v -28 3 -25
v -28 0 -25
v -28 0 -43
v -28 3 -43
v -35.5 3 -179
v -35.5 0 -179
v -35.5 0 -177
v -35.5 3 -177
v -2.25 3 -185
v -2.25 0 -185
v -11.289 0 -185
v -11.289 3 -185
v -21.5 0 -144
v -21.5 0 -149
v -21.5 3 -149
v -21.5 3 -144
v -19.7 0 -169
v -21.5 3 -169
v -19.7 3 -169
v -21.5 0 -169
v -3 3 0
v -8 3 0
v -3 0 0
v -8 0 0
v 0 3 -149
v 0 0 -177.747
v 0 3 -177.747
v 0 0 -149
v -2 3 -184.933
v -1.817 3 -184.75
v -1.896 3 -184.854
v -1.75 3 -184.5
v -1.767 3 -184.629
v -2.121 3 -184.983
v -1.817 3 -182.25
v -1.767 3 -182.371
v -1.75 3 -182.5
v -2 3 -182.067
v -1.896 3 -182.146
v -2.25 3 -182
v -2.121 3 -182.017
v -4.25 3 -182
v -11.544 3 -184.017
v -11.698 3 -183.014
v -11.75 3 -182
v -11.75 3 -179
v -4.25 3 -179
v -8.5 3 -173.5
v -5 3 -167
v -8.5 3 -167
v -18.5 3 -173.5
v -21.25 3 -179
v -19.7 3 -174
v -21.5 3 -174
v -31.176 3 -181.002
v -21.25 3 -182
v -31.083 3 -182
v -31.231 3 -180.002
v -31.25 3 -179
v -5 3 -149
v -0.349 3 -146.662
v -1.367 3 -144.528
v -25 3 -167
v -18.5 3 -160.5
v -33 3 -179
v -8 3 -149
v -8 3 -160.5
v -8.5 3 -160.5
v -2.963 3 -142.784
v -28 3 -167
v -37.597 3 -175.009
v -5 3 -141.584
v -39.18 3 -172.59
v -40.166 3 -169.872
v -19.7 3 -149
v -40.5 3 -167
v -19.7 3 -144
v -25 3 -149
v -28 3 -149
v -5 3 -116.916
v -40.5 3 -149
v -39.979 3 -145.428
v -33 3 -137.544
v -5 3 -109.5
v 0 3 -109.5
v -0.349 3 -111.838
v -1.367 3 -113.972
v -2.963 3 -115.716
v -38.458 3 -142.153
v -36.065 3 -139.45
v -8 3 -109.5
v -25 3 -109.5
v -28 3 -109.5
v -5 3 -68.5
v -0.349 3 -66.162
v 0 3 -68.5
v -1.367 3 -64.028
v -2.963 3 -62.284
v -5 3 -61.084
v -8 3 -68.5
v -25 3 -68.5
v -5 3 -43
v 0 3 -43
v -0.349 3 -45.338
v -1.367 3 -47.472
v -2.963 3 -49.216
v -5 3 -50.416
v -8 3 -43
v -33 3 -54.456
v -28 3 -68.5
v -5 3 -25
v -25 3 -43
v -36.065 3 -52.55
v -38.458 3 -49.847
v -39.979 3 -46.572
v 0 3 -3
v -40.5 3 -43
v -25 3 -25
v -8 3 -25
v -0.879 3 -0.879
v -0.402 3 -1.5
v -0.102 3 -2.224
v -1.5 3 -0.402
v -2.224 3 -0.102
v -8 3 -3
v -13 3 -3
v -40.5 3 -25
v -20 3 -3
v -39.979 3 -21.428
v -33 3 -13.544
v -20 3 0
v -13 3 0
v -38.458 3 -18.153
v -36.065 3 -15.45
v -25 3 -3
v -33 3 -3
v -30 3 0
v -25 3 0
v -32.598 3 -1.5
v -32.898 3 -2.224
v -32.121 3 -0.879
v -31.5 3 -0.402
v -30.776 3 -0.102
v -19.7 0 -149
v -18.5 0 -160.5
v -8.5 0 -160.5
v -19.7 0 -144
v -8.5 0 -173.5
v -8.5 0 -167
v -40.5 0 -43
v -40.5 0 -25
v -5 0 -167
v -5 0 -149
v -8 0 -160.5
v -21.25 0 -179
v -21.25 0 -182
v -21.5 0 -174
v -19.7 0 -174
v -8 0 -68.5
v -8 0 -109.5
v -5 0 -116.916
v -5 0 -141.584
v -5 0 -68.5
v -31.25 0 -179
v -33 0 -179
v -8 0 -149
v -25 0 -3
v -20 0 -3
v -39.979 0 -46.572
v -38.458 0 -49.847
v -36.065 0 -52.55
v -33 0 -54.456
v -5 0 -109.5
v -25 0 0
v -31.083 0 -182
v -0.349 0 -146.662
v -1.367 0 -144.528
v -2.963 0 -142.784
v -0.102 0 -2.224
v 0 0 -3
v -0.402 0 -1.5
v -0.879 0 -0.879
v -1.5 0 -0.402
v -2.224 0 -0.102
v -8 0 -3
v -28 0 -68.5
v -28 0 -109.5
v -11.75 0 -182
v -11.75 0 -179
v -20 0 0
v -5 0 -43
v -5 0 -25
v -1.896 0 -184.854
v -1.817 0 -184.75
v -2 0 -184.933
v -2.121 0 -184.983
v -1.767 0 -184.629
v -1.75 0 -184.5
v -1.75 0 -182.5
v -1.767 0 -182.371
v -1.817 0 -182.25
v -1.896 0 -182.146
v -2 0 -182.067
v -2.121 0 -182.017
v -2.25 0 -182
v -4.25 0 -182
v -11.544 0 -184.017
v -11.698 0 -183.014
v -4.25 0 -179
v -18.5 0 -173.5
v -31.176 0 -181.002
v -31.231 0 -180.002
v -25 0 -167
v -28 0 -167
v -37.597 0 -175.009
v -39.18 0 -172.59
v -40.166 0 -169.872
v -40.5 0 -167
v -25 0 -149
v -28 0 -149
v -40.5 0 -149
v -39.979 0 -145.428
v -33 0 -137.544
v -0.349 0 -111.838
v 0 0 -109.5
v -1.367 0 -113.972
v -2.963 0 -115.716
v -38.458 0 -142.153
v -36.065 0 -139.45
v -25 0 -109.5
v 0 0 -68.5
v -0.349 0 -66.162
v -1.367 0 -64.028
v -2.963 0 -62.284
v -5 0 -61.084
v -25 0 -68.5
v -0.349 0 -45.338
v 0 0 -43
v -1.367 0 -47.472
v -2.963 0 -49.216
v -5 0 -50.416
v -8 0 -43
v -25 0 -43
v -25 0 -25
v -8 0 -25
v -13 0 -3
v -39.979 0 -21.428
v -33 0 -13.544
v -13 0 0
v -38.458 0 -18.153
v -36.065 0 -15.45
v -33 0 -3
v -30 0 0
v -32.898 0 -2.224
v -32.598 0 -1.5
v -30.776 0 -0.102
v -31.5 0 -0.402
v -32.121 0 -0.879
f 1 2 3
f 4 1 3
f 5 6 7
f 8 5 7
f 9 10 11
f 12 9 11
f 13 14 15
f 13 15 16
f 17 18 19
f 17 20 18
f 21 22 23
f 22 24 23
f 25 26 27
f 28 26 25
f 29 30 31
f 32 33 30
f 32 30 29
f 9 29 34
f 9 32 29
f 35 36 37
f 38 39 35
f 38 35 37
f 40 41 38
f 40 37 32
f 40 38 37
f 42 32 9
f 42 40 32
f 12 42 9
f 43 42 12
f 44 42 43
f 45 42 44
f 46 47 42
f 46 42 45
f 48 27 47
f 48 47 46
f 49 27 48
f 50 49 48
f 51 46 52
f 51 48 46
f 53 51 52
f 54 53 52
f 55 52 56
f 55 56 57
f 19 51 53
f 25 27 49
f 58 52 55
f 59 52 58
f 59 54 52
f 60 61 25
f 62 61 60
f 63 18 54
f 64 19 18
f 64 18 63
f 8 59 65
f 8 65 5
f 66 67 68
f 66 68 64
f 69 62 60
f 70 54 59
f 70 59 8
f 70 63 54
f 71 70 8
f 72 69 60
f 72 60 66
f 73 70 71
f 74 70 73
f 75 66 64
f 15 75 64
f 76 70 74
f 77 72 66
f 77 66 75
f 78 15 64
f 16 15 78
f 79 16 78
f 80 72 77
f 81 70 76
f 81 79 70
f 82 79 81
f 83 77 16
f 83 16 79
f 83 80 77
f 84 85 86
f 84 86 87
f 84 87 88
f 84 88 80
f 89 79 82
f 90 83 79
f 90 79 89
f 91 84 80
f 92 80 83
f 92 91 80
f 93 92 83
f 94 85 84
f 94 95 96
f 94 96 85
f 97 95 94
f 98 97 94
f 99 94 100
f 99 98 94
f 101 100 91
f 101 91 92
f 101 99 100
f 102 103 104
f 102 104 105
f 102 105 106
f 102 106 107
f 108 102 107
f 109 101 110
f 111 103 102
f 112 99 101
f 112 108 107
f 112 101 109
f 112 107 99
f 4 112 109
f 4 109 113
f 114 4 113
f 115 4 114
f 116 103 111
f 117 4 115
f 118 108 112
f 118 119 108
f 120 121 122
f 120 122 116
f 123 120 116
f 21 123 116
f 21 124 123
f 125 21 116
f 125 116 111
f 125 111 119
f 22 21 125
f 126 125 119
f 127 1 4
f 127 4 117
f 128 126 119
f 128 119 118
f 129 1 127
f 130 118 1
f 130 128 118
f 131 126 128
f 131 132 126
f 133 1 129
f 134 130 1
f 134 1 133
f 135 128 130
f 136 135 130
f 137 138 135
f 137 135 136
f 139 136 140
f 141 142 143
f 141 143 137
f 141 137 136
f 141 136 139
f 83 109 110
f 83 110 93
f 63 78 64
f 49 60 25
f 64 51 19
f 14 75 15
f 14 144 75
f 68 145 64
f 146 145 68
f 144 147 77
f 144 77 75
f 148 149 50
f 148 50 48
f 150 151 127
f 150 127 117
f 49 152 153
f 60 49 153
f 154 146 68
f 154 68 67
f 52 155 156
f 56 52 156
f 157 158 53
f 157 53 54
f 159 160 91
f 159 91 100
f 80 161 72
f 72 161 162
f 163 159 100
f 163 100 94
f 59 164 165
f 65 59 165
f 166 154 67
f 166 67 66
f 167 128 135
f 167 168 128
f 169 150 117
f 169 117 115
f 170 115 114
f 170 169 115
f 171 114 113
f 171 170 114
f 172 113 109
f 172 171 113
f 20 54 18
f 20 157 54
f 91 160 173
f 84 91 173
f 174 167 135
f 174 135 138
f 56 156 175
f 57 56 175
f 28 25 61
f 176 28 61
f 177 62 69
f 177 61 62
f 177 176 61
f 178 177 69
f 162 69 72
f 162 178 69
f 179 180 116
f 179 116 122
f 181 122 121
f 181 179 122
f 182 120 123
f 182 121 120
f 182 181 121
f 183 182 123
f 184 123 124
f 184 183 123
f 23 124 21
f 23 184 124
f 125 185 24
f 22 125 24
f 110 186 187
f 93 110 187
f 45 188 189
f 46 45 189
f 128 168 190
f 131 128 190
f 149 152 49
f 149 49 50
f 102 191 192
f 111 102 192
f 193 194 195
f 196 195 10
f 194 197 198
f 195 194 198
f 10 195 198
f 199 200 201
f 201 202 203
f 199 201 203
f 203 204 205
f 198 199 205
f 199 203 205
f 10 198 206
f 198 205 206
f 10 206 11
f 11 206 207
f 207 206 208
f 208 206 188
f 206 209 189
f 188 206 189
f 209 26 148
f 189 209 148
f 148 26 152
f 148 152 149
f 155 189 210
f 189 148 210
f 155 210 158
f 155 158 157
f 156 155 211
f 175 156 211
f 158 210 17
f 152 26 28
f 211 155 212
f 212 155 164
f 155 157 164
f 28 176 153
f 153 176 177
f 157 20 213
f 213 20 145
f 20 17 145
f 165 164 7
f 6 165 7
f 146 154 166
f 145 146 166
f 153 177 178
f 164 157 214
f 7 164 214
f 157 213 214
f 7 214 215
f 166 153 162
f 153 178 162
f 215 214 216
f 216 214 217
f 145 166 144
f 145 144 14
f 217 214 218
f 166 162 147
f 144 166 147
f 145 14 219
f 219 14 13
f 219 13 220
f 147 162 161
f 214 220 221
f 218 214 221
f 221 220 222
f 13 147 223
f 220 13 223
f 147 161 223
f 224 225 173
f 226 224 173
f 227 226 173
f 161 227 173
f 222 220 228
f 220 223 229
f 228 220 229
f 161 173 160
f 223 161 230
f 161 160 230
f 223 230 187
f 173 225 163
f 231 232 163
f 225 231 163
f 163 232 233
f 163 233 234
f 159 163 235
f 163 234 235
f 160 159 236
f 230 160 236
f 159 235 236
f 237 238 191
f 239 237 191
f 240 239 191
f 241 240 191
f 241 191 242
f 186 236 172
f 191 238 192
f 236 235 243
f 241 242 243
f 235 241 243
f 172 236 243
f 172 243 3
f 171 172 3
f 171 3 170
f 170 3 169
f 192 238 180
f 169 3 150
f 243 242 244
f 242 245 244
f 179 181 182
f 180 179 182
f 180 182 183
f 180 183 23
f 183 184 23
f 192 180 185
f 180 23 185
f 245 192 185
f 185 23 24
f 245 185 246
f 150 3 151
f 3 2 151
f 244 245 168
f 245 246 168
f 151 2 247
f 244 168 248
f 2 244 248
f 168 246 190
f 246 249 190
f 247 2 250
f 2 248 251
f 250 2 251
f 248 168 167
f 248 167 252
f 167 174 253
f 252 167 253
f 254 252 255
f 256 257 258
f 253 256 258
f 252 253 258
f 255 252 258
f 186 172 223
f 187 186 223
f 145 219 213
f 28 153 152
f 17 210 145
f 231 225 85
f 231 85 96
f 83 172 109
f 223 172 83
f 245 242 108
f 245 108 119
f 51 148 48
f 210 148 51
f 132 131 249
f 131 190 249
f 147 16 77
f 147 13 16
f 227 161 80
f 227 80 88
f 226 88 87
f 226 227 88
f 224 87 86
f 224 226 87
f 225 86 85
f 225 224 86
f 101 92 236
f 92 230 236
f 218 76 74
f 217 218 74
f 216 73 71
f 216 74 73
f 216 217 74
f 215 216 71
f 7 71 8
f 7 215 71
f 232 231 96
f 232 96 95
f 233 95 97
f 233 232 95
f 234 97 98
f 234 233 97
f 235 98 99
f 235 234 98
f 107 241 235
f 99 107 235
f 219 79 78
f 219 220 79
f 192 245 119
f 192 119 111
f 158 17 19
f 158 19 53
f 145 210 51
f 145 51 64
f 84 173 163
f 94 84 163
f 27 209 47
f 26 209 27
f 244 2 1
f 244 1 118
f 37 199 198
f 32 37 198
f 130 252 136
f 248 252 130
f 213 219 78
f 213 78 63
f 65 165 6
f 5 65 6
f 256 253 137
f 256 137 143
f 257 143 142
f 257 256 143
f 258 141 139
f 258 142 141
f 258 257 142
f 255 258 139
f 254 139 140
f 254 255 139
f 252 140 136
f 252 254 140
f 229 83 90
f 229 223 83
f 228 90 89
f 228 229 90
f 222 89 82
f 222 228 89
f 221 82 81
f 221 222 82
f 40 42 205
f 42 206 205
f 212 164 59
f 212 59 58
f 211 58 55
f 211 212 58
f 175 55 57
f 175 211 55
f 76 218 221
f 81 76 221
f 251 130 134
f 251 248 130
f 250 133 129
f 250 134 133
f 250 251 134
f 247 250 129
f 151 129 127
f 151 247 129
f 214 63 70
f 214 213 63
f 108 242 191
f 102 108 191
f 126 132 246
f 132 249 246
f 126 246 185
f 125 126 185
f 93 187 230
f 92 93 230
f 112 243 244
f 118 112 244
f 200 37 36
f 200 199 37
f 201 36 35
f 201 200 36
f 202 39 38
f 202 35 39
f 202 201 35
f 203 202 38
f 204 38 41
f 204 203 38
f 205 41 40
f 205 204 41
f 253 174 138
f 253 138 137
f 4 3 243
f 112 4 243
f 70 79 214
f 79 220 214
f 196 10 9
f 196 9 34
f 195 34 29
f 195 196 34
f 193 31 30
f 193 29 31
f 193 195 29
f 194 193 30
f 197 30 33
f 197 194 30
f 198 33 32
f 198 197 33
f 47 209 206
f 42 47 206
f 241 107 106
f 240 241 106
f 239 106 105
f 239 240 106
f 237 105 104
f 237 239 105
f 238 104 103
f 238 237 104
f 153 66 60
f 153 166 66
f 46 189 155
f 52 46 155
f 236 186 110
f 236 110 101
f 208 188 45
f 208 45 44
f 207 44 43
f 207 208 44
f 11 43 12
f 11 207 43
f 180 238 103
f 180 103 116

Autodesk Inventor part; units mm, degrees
ref_plane "YZ Plane" through (0, 0, 0) normal (1, 0, 0) x (0, 1, 0)
ref_plane "XZ Plane" through (0, 0, 0) normal (0, 1, 0) x (-1, 0, 0)
ref_plane "XY Plane" through (0, 0, 0) normal (0, 0, 1) x (1, 0, 0)
sketch "Sketch1" plane through (0, 0, 0) normal (0, 1, 0) x (-1, 0, 0)
  line L0 (28, -25) -> (25, -25)
  line L1 (28, -43) -> (25, -43)
  line L2 (28, -68.5) -> (25, -68.5)
  line L3 (28, -109.5) -> (25, -109.5)
  line L4 (8, -68.5) -> (5, -68.5)
  line L5 (8, -109.5) -> (5, -109.5)
  line L6 (8, -43) -> (5, -43)
  line L7 (8, -25) -> (5, -25)
  line L8 (25, -109.5) -> (25, -68.5)
  line L9 (25, -43) -> (25, -25)
  line L10 (8, -109.5) -> (8, -68.5)
  line L11 (8, -43) -> (8, -25)
  line L12 (8, -160.5) -> (8, -149)
  line L13 (28, -149) -> (25, -149)
  line L14 (8, -149) -> (5, -149)
  line L15 (25, -149) -> (25, -167)
  line L16 (25, -167) -> (28, -167)
  line L17 (5, -167) -> (8.5, -167)
  line L18 (21.5, -169) -> (19.7, -169)
  line L19 (19.7, -169) -> (19.7, -174)
  line L20 (19.7, -174) -> (21.5, -174)
  line L21 (21.5, -174) -> (21.5, -169)
  line L22 (16.5, -110.2512) -> (16.5, -143.2512) construction
  line L23 (28, -25) -> (28, -43)
  line L24 (28, -68.5) -> (28, -109.5)
  line L25 (28, -149) -> (28, -167)
  line L26 (5, -167) -> (5, -149)
  line L27 (5, -109.5) -> (5, -68.5)
  line L28 (5, -43) -> (5, -25)
  line L29 (13, -3) -> (8, -3)
  line L30 (20, -3) -> (20, 0)
  line L31 (20, 0) -> (13, 0)
  line L32 (13, 0) -> (13, -3)
  line L33 (20, -3) -> (25, -3)
  line L34 (4.25, -179) -> (4.25, -182)
  line L35 (11.75, -179) -> (21.25, -179)
  line L36 (21.25, -179) -> (21.25, -182)
  line L37 (21.25, -182) -> (31.0828, -182)
  line L38 (31.25, -179) -> (33, -179)
  line L39 (4.25, -182) -> (2.25, -182)
  line L40 (25, -3) -> (25, 0)
  line L41 (25, 0) -> (30, 0)
  line L42 (8, -3) -> (8, 0)
  line L43 (8, 0) -> (3, 0)
  line L44 (2.25, -185) -> (11.2894, -185)
  arc A0 (31.0828, -182) -> (31.25, -179) centre (4.25, -179) ccw
  arc A1 (5, -141.5838) -> (0, -149) centre (8, -149) ccw
  arc A2 (5, -61.0838) -> (0, -68.5) centre (8, -68.5) ccw
  line L45 (5, -50.4162) -> (5, -61.0838)
  line L46 (5, -116.9162) -> (5, -141.5838)
  line L47 (19.5, -129.25) -> (13.2, -129.25) construction
  arc A3 (0, -109.5) -> (5, -116.9162) centre (8, -109.5) ccw
  line L48 (0, -177.7474) -> (0, -149)
  arc A4 (0, -43) -> (5, -50.4162) centre (8, -43) ccw
  line L49 (0, -109.5) -> (0, -68.5)
  line L50 (0, -43) -> (0, -3)
  arc A5 (33, -54.4564) -> (40.5, -43) centre (28, -43) ccw
  line L51 (40.5, -25) -> (40.5, -43)
  arc A6 (40.5, -25) -> (33, -13.5436) centre (28, -25) ccw
  line L52 (33, -3) -> (33, -13.5436)
  arc A7 (40.5, -149) -> (33, -137.5436) centre (28, -149) ccw
  line L53 (40.5, -167) -> (40.5, -149)
  arc A8 (35.5, -177) -> (40.5, -167) centre (28, -167) ccw
  line L54 (33, -54.4564) -> (33, -137.5436)
  arc A9 (33, -3) -> (30, 0) centre (30, -3) ccw
  arc A10 (3, 0) -> (0, -3) centre (3, -3) ccw
  line L55 (21.5, -144) -> (19.7, -144)
  line L56 (19.7, -144) -> (19.7, -149)
  line L57 (19.7, -149) -> (21.5, -149)
  line L58 (21.5, -149) -> (21.5, -144)
  line L59 (18.5, -160.5) -> (8.5, -160.5)
  line L60 (8.5, -167) -> (8.5, -173.5)
  line L61 (8.5, -173.5) -> (18.5, -173.5)
  line L62 (18.5, -173.5) -> (18.5, -160.5)
  line L63 (13.5, -163.9683) -> (13.5, -168.686) construction
  line L64 (14.8699, -167) -> (11.7199, -167) construction
  arc A11 (11.2894, -185) -> (11.75, -182) centre (1.75, -182) ccw
  line L65 (11.75, -182) -> (11.75, -179)
  line L66 (14.25, -179) -> (14.25, -182) construction
  line L67 (14.25, -182) -> (4.25, -182) construction
  line L68 (31.25, -179) -> (31.25, -182) construction
  line L69 (31.25, -182) -> (31.0828, -182) construction
  line L70 (33, -179) -> (35.5, -179)
  line L71 (35.5, -179) -> (35.5, -177)
  line L72 (33, -179) -> (33, -174.1753) construction
  line L73 (28, -179) -> (28, -186) construction
  line L74 (28, -186) -> (25, -186) construction
  line L75 (25, -186) -> (25, -179) construction
  line L76 (31.25, -179) -> (21.25, -179) construction
  line L77 (4.25, -179) -> (0, -177.7474)
  line L78 (1.75, -182.5) -> (1.75, -184.5)
  arc A12 (2.25, -182) -> (1.75, -182.5) centre (2.25, -182.5) ccw
  arc A13 (1.75, -184.5) -> (2.25, -185) centre (2.25, -184.5) ccw
  line L79 (8.5, -160.5) -> (8, -160.5)
  line L80 (26.5, -73.5989) -> (26.5, -105.0523) construction
  line L81 (6.5, -72.0232) -> (6.5, -105.7187) construction
  point P0 (0, 0)
  point P1 (1.75, -185)
  dimension "d7" = 18
  dimension "d8" = 25.5
  dimension "d9" = 41
  dimension "d39" = 18
  dimension "d45" = 5
  dimension "d56" = 3
  dimension "d61" = 39.5
  dimension "d64" = 12
  dimension "d65" = 7
  dimension "d74" = 176
  dimension "d75" = 17
  dimension "d85" = 10
  dimension "d90" = 5
  dimension "d92" = 25
  dimension "d104" = 6
  dimension "d105" = 5
  dimension "d106" = 1.8
  dimension "d107" = 3.5
  dimension "d108" = 20
  dimension "d112" = 8
  dimension "d113" = 12
  dimension "d114" = 7
  dimension "d115" = 10
  dimension "d116" = 3
  dimension "d121" = 2.5
  dimension "d122" = 25
  dimension "d123" = 7
  dimension "d124" = 10
  dimension "d125" = 2.5
  dimension "d126" = 2.5
  dimension "d127" = 0.5
  dimension "d129" = 13
  dimension "d130" = 10
  dimension "d134" = 17
extrude "Extrusion3" add sketch "Sketch1" along normal blind 3
properties part number "Left_wall"
